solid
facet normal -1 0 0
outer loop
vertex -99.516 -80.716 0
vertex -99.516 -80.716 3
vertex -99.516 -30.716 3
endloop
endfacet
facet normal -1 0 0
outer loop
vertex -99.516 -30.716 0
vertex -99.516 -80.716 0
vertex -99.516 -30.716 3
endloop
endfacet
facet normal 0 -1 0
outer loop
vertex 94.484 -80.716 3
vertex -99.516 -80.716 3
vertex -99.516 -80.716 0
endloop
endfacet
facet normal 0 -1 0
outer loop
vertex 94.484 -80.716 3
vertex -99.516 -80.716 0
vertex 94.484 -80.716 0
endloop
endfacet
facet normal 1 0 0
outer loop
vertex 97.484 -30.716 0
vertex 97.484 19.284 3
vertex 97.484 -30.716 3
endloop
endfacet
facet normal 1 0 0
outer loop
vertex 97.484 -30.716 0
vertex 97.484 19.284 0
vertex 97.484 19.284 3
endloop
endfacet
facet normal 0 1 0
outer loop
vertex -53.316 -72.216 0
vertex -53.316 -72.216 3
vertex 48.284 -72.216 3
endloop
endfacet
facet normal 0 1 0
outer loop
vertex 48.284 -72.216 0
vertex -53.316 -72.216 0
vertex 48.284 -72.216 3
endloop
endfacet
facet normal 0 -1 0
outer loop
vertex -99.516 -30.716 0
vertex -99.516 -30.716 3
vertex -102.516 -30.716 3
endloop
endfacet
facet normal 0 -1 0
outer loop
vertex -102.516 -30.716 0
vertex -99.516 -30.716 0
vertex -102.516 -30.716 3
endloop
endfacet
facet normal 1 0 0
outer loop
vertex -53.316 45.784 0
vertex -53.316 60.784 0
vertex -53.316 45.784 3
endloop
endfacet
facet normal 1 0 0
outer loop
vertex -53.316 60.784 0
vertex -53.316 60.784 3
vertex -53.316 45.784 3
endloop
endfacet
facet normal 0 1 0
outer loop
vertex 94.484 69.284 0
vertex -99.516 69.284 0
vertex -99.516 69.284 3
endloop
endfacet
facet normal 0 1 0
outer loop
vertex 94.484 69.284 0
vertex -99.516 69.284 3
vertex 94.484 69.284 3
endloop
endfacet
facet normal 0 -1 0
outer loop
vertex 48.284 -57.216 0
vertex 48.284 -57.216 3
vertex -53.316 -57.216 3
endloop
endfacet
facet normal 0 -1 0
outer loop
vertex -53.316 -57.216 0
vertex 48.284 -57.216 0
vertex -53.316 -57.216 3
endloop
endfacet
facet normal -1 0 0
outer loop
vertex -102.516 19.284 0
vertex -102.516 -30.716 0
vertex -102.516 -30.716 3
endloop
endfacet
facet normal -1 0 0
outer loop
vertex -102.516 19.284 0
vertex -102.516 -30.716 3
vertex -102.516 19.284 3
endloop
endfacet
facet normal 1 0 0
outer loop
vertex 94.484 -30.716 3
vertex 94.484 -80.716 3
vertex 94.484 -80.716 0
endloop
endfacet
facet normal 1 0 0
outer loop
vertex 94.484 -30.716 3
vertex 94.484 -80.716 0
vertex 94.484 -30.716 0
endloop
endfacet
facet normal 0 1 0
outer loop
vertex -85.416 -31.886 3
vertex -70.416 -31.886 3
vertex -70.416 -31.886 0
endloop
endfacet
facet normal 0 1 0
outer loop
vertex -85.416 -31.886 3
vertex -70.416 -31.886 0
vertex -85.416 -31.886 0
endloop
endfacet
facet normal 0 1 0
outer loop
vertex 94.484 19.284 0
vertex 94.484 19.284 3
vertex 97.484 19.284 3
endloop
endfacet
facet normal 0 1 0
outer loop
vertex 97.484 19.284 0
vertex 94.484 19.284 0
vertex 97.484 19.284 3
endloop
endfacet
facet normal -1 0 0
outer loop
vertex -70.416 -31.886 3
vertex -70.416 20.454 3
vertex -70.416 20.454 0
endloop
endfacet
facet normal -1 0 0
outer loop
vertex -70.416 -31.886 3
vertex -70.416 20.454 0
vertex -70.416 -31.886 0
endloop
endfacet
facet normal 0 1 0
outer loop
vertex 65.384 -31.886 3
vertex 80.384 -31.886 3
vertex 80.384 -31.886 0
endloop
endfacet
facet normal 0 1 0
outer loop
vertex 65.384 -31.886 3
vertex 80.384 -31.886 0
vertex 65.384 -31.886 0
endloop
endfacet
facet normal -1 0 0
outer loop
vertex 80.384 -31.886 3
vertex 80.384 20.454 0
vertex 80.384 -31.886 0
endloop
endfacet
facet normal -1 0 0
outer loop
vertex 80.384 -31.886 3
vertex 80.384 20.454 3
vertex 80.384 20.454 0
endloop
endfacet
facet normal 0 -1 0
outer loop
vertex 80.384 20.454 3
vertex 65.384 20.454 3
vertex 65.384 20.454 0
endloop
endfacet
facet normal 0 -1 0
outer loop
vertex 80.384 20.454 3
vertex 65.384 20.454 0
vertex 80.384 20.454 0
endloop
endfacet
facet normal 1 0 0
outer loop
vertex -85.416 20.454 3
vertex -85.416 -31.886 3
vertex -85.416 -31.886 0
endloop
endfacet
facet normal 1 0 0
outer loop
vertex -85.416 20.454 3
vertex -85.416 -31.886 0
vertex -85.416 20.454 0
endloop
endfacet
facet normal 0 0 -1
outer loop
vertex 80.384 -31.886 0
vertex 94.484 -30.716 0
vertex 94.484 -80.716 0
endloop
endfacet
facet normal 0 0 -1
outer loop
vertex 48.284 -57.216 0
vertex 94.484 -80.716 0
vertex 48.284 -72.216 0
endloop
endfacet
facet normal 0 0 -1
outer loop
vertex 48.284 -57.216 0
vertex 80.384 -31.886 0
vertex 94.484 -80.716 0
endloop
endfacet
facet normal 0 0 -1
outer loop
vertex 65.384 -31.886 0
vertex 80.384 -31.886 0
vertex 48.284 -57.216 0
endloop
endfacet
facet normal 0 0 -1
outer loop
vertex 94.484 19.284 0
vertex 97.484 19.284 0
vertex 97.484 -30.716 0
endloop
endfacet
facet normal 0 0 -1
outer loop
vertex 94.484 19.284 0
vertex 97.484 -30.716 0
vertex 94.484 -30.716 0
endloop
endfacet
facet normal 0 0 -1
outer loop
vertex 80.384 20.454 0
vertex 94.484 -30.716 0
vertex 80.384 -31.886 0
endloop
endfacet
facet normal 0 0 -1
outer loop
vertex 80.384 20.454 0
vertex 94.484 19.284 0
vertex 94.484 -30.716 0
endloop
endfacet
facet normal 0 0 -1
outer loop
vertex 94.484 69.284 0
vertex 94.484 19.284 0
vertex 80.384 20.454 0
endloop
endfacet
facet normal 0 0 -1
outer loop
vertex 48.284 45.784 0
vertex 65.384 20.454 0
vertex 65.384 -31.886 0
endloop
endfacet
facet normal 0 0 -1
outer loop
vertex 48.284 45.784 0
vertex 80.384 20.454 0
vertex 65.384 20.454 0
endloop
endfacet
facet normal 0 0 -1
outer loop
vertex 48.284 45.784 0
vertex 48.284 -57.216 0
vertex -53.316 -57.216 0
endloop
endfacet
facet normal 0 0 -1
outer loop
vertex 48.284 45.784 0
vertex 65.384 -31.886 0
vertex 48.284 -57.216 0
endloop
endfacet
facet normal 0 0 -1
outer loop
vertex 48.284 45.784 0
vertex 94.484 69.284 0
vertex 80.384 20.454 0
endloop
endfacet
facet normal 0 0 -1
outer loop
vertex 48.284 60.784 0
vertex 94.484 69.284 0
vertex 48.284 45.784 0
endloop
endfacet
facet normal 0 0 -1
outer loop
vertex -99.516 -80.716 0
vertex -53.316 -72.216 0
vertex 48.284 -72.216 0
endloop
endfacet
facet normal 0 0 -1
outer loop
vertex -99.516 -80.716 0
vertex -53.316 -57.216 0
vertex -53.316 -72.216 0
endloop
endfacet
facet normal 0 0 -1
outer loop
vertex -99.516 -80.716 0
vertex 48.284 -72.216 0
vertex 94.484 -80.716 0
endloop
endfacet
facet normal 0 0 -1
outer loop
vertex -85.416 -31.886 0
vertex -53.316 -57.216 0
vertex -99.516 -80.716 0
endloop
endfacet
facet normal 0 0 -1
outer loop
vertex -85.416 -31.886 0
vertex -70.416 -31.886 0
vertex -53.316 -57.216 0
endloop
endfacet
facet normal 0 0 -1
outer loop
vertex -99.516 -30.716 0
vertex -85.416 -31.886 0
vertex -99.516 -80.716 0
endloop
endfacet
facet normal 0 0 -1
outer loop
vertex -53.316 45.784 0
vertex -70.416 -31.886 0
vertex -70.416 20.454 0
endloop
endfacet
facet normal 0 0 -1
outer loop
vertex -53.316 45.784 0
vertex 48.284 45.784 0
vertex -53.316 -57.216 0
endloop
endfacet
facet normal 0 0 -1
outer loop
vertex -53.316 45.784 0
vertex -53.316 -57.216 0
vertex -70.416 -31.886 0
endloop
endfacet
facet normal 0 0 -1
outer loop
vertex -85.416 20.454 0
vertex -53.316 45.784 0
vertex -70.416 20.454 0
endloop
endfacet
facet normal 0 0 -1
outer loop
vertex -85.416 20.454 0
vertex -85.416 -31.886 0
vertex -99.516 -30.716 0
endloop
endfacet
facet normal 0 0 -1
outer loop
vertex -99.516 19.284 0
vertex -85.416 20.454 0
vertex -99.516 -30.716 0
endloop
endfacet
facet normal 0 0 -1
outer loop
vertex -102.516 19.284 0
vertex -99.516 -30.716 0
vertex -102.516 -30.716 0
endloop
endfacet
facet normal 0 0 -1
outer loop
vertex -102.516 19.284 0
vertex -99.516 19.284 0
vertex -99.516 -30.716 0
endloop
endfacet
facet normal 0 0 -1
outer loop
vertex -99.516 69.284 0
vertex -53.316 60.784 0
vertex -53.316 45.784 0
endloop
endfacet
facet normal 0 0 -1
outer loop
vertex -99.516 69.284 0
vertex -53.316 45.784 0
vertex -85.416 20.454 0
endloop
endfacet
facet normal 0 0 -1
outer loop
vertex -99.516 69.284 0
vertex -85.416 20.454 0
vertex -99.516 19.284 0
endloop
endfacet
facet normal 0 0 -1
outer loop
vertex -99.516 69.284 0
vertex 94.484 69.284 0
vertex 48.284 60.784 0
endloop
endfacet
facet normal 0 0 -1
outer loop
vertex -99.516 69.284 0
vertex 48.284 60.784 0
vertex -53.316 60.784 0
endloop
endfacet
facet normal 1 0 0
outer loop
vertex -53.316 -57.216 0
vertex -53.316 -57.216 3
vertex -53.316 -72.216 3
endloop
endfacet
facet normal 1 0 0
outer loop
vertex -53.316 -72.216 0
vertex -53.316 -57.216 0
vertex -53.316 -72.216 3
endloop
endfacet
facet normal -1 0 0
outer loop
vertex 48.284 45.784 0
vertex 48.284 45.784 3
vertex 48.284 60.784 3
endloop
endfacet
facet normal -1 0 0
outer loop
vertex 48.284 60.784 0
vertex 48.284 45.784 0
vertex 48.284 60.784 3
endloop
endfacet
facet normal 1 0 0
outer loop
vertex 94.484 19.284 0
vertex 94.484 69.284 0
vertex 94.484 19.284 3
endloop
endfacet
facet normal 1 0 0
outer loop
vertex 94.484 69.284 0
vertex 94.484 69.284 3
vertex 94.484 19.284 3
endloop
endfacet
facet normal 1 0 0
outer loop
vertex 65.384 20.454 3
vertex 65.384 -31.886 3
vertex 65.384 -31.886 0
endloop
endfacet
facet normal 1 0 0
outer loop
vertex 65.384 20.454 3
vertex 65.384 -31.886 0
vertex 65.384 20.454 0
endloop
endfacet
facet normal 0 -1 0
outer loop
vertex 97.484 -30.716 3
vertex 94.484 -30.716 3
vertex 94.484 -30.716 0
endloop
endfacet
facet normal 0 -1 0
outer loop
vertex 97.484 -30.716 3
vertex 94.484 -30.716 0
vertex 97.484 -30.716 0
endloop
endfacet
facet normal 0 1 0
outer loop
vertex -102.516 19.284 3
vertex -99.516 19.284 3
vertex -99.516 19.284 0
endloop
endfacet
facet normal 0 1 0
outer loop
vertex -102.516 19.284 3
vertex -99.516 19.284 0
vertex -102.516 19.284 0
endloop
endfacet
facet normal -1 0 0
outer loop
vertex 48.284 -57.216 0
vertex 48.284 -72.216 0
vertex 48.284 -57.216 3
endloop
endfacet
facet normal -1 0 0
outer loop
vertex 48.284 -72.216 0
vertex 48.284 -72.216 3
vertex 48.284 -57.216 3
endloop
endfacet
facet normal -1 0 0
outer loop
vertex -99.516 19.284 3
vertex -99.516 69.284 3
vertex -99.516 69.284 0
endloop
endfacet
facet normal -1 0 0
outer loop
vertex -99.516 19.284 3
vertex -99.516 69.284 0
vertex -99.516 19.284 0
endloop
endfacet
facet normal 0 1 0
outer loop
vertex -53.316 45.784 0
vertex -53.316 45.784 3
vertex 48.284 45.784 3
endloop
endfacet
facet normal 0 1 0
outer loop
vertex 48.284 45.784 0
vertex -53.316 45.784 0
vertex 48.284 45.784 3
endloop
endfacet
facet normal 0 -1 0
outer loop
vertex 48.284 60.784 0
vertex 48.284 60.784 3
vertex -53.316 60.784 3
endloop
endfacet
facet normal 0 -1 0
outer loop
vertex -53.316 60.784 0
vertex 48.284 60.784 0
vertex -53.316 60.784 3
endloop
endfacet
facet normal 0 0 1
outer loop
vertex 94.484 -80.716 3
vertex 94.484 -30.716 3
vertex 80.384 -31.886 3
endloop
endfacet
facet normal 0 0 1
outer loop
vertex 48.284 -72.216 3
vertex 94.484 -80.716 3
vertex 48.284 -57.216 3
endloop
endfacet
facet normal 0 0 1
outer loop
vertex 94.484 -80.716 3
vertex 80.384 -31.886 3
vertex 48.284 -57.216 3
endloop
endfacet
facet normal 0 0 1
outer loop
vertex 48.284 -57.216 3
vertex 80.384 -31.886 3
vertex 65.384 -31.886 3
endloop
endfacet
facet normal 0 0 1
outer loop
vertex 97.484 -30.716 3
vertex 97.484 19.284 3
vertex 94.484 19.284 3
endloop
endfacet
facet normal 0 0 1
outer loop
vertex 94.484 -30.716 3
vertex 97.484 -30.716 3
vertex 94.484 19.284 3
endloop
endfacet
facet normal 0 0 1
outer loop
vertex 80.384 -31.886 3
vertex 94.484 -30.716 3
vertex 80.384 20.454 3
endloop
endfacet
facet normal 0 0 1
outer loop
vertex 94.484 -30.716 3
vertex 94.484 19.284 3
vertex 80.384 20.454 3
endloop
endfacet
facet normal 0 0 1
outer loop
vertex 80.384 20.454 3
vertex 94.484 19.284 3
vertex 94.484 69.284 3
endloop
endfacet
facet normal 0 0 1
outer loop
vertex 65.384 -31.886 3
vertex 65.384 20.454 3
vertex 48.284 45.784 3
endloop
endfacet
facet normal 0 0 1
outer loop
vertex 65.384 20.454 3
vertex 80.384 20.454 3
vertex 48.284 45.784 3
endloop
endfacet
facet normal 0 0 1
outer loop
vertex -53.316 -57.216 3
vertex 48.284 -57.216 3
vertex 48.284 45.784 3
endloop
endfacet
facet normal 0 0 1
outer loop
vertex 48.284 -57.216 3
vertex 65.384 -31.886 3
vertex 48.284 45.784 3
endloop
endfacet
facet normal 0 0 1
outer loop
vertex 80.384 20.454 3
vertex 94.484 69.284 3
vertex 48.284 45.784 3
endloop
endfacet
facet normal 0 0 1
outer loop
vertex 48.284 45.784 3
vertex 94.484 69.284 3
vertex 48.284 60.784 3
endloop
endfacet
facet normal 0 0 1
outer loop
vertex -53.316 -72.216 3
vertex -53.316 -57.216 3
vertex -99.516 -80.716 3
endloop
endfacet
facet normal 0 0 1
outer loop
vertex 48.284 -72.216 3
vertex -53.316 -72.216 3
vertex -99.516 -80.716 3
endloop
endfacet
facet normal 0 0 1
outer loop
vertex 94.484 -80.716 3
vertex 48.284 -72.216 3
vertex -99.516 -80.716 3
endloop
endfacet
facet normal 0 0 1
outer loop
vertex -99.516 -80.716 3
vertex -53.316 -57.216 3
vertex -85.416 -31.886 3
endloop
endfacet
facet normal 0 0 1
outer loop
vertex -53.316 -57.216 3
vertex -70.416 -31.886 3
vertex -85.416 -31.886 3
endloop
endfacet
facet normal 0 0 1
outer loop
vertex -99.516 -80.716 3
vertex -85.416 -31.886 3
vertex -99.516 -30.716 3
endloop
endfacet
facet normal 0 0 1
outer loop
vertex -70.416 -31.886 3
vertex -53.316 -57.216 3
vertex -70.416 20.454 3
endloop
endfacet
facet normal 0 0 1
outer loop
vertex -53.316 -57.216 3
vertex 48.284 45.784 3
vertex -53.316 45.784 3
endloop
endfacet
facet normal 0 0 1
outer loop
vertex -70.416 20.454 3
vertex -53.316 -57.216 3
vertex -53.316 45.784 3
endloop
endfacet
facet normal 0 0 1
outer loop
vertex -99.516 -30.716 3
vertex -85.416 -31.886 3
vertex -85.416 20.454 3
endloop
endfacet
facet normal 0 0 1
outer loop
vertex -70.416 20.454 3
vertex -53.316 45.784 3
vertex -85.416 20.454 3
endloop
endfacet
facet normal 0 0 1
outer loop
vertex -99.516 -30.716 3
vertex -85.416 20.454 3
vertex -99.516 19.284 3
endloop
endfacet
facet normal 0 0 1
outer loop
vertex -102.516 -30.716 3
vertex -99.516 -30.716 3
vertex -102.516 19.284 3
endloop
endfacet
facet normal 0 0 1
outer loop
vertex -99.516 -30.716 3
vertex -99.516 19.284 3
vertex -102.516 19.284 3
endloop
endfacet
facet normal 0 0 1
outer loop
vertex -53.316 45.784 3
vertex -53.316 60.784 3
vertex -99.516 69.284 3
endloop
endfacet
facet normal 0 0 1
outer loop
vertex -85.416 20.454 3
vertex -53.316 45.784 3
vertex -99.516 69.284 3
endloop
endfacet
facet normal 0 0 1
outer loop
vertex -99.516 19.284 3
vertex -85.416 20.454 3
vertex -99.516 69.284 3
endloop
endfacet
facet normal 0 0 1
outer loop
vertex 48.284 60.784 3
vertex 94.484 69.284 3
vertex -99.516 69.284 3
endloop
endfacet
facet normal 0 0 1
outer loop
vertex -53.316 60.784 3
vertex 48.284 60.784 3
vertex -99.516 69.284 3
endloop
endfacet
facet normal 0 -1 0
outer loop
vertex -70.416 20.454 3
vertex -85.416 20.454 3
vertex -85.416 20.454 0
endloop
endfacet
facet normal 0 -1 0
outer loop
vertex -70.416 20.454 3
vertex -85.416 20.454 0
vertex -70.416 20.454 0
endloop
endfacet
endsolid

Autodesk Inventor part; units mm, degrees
ref_plane "YZ Plane" through (0, 0, 0) normal (1, 0, 0) x (0, 1, 0)
ref_plane "XZ Plane" through (0, 0, 0) normal (0, 1, 0) x (-1, 0, 0)
ref_plane "XY Plane" through (0, 0, 0) normal (0, 0, 1) x (1, 0, 0)
sketch "Sketch1" plane through (0, 0, 0) normal (0, 0, 1) x (1, 0, 0)
  line L0 (-102.5157, 69.2842) -> (97.4843, 69.2842)
  line L1 (97.4843, 69.2842) -> (97.4843, -80.7158)
  line L2 (97.4843, -80.7158) -> (-102.5157, -80.7158)
  line L3 (-102.5157, -80.7158) -> (-102.5157, 69.2842)
  point P0 (0, 0)
extrude "Extrusion1" add sketch "Sketch1" along normal blind 3
sketch "Sketch3" plane through (0, 0, 3) normal (0, 0, 1) x (1, 0, 0)
  point P0 (0, 0)
sketch "Sketch4" plane through (0, 0, 3) normal (0, 0, 1) x (1, 0, 0)
  line L0 (97.4843, 69.2842) -> (-102.5157, 69.2842) projected
  line L1 (-102.5157, 69.2842) -> (-99.5157, 69.2842)
  line L2 (-99.5157, 69.2842) -> (-99.5157, 19.2842)
  line L3 (-99.5157, 19.2842) -> (-102.5157, 19.2842)
  line L4 (-102.5157, 19.2842) -> (-102.5157, 69.2842)
  point P0 (0, 0)
extrude "Extrusion2" cut sketch "Sketch4" against normal blind 3
sketch "Sketch5" plane through (0, 0, 3) normal (0, 0, 1) x (1, 0, 0)
  line L0 (97.4843, -80.7158) -> (94.4843, -80.7158)
  line L1 (94.4843, -80.7158) -> (94.4843, -30.7158)
  line L2 (94.4843, -30.7158) -> (97.4843, -30.7158)
  line L3 (97.4843, -30.7158) -> (97.4843, -80.7158)
  point P0 (0, 0)
  point P1 (-102.5157, -80.7158)
  dimension "d17" = 3
  dimension "d18" = 50
extrude "Extrusion3" cut sketch "Sketch5" against normal blind 3
sketch "Sketch6" plane through (0, 0, 3) normal (0, 0, 1) x (1, 0, 0)
  line L0 (97.4843, -30.7158) -> (97.4843, 69.2842) projected
  line L1 (97.4843, 69.2842) -> (94.4843, 69.2842)
  line L2 (94.4843, 69.2842) -> (94.4843, 19.2842)
  line L3 (94.4843, 19.2842) -> (97.4843, 19.2842)
  line L4 (97.4843, 19.2842) -> (97.4843, 69.2842)
  point P0 (0, 0)
  dimension "d21" = 50
  dimension "d22" = 3
extrude "Extrusion4" cut sketch "Sketch6" against normal blind 3
sketch "Sketch7" plane through (0, 0, 3) normal (0, 0, 1) x (1, 0, 0)
  line L0 (-102.5157, 19.2842) -> (-102.5157, -80.7158) projected
  line L1 (-102.5157, -80.7158) -> (-99.5157, -80.7158)
  line L2 (-99.5157, -80.7158) -> (-99.5157, -30.7158)
  line L3 (-99.5157, -30.7158) -> (-102.5157, -30.7158)
  line L4 (-102.5157, -30.7158) -> (-102.5157, -80.7158)
  point P0 (0, 0)
  dimension "d25" = 50
  dimension "d26" = 3
extrude "Extrusion5" cut sketch "Sketch7" against normal blind 3
sketch "Sketch8" plane through (0, 0, 3) normal (0, 0, 1) x (1, 0, 0)
  line L0 (-102.5157, -30.7158) -> (-102.5157, 19.2842) projected
  line L1 (97.4843, -30.7158) -> (94.4843, -30.7158) projected
  line L2 (94.4843, -80.7158) -> (-99.5157, -80.7158) projected
  line L3 (-10.0157, -50.7158) -> (4.9843, -50.7158)
  line L4 (4.9843, -50.7158) -> (4.9843, -80.7158)
  line L5 (4.9843, -80.7158) -> (-10.0157, -80.7158)
  line L6 (-10.0157, -80.7158) -> (-10.0157, -50.7158)
  point P0 (0, 0)
  dimension "d32" = 15
  dimension "d33" = 30
extrude "Extrusion6" cut sketch "Sketch8" against normal blind 3
sketch "Sketch9" plane through (-10.0157, -80.7158, 3) normal (1, 0, 0) x (0, 0, -1)
  point P0 (3, 80.7158)
sketch "Sketch10" plane through (-10.0157, -50.7158, 3) normal (0, -1, 0) x (1, 0, 0)
  line L0 (15, 0) -> (15, -3) projected
  line L1 (15, -3) -> (0, -3) projected
  line L2 (15, 0) -> (0, 0)
  line L3 (0, 0) -> (0, -3)
  line L4 (0, -3) -> (15, -3)
  line L5 (15, -3) -> (15, 0)
  point P0 (10.0157, -3)
extrude "Extrusion7" add sketch "Sketch10" along normal blind 30
sketch "Sketch11" plane through (0, 0, 3) normal (0, 0, 1) x (1, 0, 0)
  line L0 (94.4843, -80.7158) -> (-99.5157, -80.7158) projected
  line L1 (-99.5157, -80.7158) -> (-99.5157, -30.7158) projected
  line L2 (97.4843, 19.2842) -> (97.4843, -30.7158) projected
  line L3 (-102.5157, -30.7158) -> (-102.5157, 19.2842) projected
  line L4 (-99.5157, 69.2842) -> (94.4843, 69.2842) projected
  point P0 (0, 0)
sketch "Sketch12" plane through (0, 0, 3) normal (0, 0, 1) x (1, 0, 0)
  circle A0 centre (34.4088, 18.4314) radius 1.5
  circle A1 centre (33.1388, -29.8286) radius 1.5
  circle A2 centre (-41.7912, -29.8286) radius 1.5
  circle A3 centre (-48.1412, 18.4314) radius 1.5
  point P0 (0, 0)
extrude "Extrusion8" cut sketch "Sketch12" against normal blind 3
sketch "Sketch13" plane through (0, 0, 3) normal (0, 0, 1) x (1, 0, 0)
  line L0 (-99.5157, 69.2842) -> (94.4843, 69.2842) projected
  line L1 (-102.5157, -30.7158) -> (-102.5157, 19.2842) projected
  line L2 (94.4843, -80.7158) -> (-99.5157, -80.7158) projected
  line L3 (-85.4157, 20.4542) -> (-70.4157, 20.4542)
  line L4 (-70.4157, 20.4542) -> (-70.4157, -31.8858)
  line L5 (-70.4157, -31.8858) -> (-85.4157, -31.8858)
  line L6 (-85.4157, -31.8858) -> (-85.4157, 20.4542)
  line L7 (-53.3157, 45.7842) -> (48.2843, 45.7842)
  line L8 (48.2843, 45.7842) -> (48.2843, 60.7842)
  line L9 (48.2843, 60.7842) -> (-53.3157, 60.7842)
  line L10 (-53.3157, 60.7842) -> (-53.3157, 45.7842)
  line L11 (65.3843, 20.4542) -> (80.3843, 20.4542)
  line L12 (80.3843, 20.4542) -> (80.3843, -31.8858)
  line L13 (80.3843, -31.8858) -> (65.3843, -31.8858)
  line L14 (65.3843, -31.8858) -> (65.3843, 20.4542)
  line L15 (97.4843, -30.7158) -> (97.4843, 19.2842) projected
  line L16 (94.4843, 69.2842) -> (94.4843, 19.2842) projected
  line L17 (-99.5157, 19.2842) -> (-99.5157, 69.2842) projected
  line L18 (-53.3157, -72.2158) -> (48.2843, -72.2158)
  line L19 (48.2843, -72.2158) -> (48.2843, -57.2158)
  line L20 (48.2843, -57.2158) -> (-53.3157, -57.2158)
  line L21 (-53.3157, -57.2158) -> (-53.3157, -72.2158)
  line L22 (-99.5157, -30.7158) -> (-99.5157, -80.7158) projected
  line L23 (94.4843, -30.7158) -> (94.4843, -80.7158) projected
  point P0 (0, 0)
extrude "Extrusion9" cut sketch "Sketch13" against normal blind 3
sketch "Sketch14" plane through (0, 0, 3) normal (0, 0, 1) x (1, 0, 0)
  circle A0 centre (-48.1412, 18.4314) radius 1.5 projected
  circle A1 centre (-48.1412, 18.4314) radius 1.5
  circle A2 centre (34.4088, 18.4314) radius 1.5 projected
  circle A3 centre (34.4088, 18.4314) radius 1.5
  circle A4 centre (33.1388, -29.8286) radius 1.5 projected
  circle A5 centre (33.1388, -29.8286) radius 1.5
  circle A6 centre (-41.7912, -29.8286) radius 1.5 projected
  circle A7 centre (-41.7912, -29.8286) radius 1.5
  point P0 (0, 0)
extrude "Extrusion10" add sketch "Sketch14" against normal blind 3
sketch "Sketch15" plane through (0, 0, 3) normal (0, 0, 1) x (1, 0, 0)
  point P0 (0, 0)
properties part number "Level2"
